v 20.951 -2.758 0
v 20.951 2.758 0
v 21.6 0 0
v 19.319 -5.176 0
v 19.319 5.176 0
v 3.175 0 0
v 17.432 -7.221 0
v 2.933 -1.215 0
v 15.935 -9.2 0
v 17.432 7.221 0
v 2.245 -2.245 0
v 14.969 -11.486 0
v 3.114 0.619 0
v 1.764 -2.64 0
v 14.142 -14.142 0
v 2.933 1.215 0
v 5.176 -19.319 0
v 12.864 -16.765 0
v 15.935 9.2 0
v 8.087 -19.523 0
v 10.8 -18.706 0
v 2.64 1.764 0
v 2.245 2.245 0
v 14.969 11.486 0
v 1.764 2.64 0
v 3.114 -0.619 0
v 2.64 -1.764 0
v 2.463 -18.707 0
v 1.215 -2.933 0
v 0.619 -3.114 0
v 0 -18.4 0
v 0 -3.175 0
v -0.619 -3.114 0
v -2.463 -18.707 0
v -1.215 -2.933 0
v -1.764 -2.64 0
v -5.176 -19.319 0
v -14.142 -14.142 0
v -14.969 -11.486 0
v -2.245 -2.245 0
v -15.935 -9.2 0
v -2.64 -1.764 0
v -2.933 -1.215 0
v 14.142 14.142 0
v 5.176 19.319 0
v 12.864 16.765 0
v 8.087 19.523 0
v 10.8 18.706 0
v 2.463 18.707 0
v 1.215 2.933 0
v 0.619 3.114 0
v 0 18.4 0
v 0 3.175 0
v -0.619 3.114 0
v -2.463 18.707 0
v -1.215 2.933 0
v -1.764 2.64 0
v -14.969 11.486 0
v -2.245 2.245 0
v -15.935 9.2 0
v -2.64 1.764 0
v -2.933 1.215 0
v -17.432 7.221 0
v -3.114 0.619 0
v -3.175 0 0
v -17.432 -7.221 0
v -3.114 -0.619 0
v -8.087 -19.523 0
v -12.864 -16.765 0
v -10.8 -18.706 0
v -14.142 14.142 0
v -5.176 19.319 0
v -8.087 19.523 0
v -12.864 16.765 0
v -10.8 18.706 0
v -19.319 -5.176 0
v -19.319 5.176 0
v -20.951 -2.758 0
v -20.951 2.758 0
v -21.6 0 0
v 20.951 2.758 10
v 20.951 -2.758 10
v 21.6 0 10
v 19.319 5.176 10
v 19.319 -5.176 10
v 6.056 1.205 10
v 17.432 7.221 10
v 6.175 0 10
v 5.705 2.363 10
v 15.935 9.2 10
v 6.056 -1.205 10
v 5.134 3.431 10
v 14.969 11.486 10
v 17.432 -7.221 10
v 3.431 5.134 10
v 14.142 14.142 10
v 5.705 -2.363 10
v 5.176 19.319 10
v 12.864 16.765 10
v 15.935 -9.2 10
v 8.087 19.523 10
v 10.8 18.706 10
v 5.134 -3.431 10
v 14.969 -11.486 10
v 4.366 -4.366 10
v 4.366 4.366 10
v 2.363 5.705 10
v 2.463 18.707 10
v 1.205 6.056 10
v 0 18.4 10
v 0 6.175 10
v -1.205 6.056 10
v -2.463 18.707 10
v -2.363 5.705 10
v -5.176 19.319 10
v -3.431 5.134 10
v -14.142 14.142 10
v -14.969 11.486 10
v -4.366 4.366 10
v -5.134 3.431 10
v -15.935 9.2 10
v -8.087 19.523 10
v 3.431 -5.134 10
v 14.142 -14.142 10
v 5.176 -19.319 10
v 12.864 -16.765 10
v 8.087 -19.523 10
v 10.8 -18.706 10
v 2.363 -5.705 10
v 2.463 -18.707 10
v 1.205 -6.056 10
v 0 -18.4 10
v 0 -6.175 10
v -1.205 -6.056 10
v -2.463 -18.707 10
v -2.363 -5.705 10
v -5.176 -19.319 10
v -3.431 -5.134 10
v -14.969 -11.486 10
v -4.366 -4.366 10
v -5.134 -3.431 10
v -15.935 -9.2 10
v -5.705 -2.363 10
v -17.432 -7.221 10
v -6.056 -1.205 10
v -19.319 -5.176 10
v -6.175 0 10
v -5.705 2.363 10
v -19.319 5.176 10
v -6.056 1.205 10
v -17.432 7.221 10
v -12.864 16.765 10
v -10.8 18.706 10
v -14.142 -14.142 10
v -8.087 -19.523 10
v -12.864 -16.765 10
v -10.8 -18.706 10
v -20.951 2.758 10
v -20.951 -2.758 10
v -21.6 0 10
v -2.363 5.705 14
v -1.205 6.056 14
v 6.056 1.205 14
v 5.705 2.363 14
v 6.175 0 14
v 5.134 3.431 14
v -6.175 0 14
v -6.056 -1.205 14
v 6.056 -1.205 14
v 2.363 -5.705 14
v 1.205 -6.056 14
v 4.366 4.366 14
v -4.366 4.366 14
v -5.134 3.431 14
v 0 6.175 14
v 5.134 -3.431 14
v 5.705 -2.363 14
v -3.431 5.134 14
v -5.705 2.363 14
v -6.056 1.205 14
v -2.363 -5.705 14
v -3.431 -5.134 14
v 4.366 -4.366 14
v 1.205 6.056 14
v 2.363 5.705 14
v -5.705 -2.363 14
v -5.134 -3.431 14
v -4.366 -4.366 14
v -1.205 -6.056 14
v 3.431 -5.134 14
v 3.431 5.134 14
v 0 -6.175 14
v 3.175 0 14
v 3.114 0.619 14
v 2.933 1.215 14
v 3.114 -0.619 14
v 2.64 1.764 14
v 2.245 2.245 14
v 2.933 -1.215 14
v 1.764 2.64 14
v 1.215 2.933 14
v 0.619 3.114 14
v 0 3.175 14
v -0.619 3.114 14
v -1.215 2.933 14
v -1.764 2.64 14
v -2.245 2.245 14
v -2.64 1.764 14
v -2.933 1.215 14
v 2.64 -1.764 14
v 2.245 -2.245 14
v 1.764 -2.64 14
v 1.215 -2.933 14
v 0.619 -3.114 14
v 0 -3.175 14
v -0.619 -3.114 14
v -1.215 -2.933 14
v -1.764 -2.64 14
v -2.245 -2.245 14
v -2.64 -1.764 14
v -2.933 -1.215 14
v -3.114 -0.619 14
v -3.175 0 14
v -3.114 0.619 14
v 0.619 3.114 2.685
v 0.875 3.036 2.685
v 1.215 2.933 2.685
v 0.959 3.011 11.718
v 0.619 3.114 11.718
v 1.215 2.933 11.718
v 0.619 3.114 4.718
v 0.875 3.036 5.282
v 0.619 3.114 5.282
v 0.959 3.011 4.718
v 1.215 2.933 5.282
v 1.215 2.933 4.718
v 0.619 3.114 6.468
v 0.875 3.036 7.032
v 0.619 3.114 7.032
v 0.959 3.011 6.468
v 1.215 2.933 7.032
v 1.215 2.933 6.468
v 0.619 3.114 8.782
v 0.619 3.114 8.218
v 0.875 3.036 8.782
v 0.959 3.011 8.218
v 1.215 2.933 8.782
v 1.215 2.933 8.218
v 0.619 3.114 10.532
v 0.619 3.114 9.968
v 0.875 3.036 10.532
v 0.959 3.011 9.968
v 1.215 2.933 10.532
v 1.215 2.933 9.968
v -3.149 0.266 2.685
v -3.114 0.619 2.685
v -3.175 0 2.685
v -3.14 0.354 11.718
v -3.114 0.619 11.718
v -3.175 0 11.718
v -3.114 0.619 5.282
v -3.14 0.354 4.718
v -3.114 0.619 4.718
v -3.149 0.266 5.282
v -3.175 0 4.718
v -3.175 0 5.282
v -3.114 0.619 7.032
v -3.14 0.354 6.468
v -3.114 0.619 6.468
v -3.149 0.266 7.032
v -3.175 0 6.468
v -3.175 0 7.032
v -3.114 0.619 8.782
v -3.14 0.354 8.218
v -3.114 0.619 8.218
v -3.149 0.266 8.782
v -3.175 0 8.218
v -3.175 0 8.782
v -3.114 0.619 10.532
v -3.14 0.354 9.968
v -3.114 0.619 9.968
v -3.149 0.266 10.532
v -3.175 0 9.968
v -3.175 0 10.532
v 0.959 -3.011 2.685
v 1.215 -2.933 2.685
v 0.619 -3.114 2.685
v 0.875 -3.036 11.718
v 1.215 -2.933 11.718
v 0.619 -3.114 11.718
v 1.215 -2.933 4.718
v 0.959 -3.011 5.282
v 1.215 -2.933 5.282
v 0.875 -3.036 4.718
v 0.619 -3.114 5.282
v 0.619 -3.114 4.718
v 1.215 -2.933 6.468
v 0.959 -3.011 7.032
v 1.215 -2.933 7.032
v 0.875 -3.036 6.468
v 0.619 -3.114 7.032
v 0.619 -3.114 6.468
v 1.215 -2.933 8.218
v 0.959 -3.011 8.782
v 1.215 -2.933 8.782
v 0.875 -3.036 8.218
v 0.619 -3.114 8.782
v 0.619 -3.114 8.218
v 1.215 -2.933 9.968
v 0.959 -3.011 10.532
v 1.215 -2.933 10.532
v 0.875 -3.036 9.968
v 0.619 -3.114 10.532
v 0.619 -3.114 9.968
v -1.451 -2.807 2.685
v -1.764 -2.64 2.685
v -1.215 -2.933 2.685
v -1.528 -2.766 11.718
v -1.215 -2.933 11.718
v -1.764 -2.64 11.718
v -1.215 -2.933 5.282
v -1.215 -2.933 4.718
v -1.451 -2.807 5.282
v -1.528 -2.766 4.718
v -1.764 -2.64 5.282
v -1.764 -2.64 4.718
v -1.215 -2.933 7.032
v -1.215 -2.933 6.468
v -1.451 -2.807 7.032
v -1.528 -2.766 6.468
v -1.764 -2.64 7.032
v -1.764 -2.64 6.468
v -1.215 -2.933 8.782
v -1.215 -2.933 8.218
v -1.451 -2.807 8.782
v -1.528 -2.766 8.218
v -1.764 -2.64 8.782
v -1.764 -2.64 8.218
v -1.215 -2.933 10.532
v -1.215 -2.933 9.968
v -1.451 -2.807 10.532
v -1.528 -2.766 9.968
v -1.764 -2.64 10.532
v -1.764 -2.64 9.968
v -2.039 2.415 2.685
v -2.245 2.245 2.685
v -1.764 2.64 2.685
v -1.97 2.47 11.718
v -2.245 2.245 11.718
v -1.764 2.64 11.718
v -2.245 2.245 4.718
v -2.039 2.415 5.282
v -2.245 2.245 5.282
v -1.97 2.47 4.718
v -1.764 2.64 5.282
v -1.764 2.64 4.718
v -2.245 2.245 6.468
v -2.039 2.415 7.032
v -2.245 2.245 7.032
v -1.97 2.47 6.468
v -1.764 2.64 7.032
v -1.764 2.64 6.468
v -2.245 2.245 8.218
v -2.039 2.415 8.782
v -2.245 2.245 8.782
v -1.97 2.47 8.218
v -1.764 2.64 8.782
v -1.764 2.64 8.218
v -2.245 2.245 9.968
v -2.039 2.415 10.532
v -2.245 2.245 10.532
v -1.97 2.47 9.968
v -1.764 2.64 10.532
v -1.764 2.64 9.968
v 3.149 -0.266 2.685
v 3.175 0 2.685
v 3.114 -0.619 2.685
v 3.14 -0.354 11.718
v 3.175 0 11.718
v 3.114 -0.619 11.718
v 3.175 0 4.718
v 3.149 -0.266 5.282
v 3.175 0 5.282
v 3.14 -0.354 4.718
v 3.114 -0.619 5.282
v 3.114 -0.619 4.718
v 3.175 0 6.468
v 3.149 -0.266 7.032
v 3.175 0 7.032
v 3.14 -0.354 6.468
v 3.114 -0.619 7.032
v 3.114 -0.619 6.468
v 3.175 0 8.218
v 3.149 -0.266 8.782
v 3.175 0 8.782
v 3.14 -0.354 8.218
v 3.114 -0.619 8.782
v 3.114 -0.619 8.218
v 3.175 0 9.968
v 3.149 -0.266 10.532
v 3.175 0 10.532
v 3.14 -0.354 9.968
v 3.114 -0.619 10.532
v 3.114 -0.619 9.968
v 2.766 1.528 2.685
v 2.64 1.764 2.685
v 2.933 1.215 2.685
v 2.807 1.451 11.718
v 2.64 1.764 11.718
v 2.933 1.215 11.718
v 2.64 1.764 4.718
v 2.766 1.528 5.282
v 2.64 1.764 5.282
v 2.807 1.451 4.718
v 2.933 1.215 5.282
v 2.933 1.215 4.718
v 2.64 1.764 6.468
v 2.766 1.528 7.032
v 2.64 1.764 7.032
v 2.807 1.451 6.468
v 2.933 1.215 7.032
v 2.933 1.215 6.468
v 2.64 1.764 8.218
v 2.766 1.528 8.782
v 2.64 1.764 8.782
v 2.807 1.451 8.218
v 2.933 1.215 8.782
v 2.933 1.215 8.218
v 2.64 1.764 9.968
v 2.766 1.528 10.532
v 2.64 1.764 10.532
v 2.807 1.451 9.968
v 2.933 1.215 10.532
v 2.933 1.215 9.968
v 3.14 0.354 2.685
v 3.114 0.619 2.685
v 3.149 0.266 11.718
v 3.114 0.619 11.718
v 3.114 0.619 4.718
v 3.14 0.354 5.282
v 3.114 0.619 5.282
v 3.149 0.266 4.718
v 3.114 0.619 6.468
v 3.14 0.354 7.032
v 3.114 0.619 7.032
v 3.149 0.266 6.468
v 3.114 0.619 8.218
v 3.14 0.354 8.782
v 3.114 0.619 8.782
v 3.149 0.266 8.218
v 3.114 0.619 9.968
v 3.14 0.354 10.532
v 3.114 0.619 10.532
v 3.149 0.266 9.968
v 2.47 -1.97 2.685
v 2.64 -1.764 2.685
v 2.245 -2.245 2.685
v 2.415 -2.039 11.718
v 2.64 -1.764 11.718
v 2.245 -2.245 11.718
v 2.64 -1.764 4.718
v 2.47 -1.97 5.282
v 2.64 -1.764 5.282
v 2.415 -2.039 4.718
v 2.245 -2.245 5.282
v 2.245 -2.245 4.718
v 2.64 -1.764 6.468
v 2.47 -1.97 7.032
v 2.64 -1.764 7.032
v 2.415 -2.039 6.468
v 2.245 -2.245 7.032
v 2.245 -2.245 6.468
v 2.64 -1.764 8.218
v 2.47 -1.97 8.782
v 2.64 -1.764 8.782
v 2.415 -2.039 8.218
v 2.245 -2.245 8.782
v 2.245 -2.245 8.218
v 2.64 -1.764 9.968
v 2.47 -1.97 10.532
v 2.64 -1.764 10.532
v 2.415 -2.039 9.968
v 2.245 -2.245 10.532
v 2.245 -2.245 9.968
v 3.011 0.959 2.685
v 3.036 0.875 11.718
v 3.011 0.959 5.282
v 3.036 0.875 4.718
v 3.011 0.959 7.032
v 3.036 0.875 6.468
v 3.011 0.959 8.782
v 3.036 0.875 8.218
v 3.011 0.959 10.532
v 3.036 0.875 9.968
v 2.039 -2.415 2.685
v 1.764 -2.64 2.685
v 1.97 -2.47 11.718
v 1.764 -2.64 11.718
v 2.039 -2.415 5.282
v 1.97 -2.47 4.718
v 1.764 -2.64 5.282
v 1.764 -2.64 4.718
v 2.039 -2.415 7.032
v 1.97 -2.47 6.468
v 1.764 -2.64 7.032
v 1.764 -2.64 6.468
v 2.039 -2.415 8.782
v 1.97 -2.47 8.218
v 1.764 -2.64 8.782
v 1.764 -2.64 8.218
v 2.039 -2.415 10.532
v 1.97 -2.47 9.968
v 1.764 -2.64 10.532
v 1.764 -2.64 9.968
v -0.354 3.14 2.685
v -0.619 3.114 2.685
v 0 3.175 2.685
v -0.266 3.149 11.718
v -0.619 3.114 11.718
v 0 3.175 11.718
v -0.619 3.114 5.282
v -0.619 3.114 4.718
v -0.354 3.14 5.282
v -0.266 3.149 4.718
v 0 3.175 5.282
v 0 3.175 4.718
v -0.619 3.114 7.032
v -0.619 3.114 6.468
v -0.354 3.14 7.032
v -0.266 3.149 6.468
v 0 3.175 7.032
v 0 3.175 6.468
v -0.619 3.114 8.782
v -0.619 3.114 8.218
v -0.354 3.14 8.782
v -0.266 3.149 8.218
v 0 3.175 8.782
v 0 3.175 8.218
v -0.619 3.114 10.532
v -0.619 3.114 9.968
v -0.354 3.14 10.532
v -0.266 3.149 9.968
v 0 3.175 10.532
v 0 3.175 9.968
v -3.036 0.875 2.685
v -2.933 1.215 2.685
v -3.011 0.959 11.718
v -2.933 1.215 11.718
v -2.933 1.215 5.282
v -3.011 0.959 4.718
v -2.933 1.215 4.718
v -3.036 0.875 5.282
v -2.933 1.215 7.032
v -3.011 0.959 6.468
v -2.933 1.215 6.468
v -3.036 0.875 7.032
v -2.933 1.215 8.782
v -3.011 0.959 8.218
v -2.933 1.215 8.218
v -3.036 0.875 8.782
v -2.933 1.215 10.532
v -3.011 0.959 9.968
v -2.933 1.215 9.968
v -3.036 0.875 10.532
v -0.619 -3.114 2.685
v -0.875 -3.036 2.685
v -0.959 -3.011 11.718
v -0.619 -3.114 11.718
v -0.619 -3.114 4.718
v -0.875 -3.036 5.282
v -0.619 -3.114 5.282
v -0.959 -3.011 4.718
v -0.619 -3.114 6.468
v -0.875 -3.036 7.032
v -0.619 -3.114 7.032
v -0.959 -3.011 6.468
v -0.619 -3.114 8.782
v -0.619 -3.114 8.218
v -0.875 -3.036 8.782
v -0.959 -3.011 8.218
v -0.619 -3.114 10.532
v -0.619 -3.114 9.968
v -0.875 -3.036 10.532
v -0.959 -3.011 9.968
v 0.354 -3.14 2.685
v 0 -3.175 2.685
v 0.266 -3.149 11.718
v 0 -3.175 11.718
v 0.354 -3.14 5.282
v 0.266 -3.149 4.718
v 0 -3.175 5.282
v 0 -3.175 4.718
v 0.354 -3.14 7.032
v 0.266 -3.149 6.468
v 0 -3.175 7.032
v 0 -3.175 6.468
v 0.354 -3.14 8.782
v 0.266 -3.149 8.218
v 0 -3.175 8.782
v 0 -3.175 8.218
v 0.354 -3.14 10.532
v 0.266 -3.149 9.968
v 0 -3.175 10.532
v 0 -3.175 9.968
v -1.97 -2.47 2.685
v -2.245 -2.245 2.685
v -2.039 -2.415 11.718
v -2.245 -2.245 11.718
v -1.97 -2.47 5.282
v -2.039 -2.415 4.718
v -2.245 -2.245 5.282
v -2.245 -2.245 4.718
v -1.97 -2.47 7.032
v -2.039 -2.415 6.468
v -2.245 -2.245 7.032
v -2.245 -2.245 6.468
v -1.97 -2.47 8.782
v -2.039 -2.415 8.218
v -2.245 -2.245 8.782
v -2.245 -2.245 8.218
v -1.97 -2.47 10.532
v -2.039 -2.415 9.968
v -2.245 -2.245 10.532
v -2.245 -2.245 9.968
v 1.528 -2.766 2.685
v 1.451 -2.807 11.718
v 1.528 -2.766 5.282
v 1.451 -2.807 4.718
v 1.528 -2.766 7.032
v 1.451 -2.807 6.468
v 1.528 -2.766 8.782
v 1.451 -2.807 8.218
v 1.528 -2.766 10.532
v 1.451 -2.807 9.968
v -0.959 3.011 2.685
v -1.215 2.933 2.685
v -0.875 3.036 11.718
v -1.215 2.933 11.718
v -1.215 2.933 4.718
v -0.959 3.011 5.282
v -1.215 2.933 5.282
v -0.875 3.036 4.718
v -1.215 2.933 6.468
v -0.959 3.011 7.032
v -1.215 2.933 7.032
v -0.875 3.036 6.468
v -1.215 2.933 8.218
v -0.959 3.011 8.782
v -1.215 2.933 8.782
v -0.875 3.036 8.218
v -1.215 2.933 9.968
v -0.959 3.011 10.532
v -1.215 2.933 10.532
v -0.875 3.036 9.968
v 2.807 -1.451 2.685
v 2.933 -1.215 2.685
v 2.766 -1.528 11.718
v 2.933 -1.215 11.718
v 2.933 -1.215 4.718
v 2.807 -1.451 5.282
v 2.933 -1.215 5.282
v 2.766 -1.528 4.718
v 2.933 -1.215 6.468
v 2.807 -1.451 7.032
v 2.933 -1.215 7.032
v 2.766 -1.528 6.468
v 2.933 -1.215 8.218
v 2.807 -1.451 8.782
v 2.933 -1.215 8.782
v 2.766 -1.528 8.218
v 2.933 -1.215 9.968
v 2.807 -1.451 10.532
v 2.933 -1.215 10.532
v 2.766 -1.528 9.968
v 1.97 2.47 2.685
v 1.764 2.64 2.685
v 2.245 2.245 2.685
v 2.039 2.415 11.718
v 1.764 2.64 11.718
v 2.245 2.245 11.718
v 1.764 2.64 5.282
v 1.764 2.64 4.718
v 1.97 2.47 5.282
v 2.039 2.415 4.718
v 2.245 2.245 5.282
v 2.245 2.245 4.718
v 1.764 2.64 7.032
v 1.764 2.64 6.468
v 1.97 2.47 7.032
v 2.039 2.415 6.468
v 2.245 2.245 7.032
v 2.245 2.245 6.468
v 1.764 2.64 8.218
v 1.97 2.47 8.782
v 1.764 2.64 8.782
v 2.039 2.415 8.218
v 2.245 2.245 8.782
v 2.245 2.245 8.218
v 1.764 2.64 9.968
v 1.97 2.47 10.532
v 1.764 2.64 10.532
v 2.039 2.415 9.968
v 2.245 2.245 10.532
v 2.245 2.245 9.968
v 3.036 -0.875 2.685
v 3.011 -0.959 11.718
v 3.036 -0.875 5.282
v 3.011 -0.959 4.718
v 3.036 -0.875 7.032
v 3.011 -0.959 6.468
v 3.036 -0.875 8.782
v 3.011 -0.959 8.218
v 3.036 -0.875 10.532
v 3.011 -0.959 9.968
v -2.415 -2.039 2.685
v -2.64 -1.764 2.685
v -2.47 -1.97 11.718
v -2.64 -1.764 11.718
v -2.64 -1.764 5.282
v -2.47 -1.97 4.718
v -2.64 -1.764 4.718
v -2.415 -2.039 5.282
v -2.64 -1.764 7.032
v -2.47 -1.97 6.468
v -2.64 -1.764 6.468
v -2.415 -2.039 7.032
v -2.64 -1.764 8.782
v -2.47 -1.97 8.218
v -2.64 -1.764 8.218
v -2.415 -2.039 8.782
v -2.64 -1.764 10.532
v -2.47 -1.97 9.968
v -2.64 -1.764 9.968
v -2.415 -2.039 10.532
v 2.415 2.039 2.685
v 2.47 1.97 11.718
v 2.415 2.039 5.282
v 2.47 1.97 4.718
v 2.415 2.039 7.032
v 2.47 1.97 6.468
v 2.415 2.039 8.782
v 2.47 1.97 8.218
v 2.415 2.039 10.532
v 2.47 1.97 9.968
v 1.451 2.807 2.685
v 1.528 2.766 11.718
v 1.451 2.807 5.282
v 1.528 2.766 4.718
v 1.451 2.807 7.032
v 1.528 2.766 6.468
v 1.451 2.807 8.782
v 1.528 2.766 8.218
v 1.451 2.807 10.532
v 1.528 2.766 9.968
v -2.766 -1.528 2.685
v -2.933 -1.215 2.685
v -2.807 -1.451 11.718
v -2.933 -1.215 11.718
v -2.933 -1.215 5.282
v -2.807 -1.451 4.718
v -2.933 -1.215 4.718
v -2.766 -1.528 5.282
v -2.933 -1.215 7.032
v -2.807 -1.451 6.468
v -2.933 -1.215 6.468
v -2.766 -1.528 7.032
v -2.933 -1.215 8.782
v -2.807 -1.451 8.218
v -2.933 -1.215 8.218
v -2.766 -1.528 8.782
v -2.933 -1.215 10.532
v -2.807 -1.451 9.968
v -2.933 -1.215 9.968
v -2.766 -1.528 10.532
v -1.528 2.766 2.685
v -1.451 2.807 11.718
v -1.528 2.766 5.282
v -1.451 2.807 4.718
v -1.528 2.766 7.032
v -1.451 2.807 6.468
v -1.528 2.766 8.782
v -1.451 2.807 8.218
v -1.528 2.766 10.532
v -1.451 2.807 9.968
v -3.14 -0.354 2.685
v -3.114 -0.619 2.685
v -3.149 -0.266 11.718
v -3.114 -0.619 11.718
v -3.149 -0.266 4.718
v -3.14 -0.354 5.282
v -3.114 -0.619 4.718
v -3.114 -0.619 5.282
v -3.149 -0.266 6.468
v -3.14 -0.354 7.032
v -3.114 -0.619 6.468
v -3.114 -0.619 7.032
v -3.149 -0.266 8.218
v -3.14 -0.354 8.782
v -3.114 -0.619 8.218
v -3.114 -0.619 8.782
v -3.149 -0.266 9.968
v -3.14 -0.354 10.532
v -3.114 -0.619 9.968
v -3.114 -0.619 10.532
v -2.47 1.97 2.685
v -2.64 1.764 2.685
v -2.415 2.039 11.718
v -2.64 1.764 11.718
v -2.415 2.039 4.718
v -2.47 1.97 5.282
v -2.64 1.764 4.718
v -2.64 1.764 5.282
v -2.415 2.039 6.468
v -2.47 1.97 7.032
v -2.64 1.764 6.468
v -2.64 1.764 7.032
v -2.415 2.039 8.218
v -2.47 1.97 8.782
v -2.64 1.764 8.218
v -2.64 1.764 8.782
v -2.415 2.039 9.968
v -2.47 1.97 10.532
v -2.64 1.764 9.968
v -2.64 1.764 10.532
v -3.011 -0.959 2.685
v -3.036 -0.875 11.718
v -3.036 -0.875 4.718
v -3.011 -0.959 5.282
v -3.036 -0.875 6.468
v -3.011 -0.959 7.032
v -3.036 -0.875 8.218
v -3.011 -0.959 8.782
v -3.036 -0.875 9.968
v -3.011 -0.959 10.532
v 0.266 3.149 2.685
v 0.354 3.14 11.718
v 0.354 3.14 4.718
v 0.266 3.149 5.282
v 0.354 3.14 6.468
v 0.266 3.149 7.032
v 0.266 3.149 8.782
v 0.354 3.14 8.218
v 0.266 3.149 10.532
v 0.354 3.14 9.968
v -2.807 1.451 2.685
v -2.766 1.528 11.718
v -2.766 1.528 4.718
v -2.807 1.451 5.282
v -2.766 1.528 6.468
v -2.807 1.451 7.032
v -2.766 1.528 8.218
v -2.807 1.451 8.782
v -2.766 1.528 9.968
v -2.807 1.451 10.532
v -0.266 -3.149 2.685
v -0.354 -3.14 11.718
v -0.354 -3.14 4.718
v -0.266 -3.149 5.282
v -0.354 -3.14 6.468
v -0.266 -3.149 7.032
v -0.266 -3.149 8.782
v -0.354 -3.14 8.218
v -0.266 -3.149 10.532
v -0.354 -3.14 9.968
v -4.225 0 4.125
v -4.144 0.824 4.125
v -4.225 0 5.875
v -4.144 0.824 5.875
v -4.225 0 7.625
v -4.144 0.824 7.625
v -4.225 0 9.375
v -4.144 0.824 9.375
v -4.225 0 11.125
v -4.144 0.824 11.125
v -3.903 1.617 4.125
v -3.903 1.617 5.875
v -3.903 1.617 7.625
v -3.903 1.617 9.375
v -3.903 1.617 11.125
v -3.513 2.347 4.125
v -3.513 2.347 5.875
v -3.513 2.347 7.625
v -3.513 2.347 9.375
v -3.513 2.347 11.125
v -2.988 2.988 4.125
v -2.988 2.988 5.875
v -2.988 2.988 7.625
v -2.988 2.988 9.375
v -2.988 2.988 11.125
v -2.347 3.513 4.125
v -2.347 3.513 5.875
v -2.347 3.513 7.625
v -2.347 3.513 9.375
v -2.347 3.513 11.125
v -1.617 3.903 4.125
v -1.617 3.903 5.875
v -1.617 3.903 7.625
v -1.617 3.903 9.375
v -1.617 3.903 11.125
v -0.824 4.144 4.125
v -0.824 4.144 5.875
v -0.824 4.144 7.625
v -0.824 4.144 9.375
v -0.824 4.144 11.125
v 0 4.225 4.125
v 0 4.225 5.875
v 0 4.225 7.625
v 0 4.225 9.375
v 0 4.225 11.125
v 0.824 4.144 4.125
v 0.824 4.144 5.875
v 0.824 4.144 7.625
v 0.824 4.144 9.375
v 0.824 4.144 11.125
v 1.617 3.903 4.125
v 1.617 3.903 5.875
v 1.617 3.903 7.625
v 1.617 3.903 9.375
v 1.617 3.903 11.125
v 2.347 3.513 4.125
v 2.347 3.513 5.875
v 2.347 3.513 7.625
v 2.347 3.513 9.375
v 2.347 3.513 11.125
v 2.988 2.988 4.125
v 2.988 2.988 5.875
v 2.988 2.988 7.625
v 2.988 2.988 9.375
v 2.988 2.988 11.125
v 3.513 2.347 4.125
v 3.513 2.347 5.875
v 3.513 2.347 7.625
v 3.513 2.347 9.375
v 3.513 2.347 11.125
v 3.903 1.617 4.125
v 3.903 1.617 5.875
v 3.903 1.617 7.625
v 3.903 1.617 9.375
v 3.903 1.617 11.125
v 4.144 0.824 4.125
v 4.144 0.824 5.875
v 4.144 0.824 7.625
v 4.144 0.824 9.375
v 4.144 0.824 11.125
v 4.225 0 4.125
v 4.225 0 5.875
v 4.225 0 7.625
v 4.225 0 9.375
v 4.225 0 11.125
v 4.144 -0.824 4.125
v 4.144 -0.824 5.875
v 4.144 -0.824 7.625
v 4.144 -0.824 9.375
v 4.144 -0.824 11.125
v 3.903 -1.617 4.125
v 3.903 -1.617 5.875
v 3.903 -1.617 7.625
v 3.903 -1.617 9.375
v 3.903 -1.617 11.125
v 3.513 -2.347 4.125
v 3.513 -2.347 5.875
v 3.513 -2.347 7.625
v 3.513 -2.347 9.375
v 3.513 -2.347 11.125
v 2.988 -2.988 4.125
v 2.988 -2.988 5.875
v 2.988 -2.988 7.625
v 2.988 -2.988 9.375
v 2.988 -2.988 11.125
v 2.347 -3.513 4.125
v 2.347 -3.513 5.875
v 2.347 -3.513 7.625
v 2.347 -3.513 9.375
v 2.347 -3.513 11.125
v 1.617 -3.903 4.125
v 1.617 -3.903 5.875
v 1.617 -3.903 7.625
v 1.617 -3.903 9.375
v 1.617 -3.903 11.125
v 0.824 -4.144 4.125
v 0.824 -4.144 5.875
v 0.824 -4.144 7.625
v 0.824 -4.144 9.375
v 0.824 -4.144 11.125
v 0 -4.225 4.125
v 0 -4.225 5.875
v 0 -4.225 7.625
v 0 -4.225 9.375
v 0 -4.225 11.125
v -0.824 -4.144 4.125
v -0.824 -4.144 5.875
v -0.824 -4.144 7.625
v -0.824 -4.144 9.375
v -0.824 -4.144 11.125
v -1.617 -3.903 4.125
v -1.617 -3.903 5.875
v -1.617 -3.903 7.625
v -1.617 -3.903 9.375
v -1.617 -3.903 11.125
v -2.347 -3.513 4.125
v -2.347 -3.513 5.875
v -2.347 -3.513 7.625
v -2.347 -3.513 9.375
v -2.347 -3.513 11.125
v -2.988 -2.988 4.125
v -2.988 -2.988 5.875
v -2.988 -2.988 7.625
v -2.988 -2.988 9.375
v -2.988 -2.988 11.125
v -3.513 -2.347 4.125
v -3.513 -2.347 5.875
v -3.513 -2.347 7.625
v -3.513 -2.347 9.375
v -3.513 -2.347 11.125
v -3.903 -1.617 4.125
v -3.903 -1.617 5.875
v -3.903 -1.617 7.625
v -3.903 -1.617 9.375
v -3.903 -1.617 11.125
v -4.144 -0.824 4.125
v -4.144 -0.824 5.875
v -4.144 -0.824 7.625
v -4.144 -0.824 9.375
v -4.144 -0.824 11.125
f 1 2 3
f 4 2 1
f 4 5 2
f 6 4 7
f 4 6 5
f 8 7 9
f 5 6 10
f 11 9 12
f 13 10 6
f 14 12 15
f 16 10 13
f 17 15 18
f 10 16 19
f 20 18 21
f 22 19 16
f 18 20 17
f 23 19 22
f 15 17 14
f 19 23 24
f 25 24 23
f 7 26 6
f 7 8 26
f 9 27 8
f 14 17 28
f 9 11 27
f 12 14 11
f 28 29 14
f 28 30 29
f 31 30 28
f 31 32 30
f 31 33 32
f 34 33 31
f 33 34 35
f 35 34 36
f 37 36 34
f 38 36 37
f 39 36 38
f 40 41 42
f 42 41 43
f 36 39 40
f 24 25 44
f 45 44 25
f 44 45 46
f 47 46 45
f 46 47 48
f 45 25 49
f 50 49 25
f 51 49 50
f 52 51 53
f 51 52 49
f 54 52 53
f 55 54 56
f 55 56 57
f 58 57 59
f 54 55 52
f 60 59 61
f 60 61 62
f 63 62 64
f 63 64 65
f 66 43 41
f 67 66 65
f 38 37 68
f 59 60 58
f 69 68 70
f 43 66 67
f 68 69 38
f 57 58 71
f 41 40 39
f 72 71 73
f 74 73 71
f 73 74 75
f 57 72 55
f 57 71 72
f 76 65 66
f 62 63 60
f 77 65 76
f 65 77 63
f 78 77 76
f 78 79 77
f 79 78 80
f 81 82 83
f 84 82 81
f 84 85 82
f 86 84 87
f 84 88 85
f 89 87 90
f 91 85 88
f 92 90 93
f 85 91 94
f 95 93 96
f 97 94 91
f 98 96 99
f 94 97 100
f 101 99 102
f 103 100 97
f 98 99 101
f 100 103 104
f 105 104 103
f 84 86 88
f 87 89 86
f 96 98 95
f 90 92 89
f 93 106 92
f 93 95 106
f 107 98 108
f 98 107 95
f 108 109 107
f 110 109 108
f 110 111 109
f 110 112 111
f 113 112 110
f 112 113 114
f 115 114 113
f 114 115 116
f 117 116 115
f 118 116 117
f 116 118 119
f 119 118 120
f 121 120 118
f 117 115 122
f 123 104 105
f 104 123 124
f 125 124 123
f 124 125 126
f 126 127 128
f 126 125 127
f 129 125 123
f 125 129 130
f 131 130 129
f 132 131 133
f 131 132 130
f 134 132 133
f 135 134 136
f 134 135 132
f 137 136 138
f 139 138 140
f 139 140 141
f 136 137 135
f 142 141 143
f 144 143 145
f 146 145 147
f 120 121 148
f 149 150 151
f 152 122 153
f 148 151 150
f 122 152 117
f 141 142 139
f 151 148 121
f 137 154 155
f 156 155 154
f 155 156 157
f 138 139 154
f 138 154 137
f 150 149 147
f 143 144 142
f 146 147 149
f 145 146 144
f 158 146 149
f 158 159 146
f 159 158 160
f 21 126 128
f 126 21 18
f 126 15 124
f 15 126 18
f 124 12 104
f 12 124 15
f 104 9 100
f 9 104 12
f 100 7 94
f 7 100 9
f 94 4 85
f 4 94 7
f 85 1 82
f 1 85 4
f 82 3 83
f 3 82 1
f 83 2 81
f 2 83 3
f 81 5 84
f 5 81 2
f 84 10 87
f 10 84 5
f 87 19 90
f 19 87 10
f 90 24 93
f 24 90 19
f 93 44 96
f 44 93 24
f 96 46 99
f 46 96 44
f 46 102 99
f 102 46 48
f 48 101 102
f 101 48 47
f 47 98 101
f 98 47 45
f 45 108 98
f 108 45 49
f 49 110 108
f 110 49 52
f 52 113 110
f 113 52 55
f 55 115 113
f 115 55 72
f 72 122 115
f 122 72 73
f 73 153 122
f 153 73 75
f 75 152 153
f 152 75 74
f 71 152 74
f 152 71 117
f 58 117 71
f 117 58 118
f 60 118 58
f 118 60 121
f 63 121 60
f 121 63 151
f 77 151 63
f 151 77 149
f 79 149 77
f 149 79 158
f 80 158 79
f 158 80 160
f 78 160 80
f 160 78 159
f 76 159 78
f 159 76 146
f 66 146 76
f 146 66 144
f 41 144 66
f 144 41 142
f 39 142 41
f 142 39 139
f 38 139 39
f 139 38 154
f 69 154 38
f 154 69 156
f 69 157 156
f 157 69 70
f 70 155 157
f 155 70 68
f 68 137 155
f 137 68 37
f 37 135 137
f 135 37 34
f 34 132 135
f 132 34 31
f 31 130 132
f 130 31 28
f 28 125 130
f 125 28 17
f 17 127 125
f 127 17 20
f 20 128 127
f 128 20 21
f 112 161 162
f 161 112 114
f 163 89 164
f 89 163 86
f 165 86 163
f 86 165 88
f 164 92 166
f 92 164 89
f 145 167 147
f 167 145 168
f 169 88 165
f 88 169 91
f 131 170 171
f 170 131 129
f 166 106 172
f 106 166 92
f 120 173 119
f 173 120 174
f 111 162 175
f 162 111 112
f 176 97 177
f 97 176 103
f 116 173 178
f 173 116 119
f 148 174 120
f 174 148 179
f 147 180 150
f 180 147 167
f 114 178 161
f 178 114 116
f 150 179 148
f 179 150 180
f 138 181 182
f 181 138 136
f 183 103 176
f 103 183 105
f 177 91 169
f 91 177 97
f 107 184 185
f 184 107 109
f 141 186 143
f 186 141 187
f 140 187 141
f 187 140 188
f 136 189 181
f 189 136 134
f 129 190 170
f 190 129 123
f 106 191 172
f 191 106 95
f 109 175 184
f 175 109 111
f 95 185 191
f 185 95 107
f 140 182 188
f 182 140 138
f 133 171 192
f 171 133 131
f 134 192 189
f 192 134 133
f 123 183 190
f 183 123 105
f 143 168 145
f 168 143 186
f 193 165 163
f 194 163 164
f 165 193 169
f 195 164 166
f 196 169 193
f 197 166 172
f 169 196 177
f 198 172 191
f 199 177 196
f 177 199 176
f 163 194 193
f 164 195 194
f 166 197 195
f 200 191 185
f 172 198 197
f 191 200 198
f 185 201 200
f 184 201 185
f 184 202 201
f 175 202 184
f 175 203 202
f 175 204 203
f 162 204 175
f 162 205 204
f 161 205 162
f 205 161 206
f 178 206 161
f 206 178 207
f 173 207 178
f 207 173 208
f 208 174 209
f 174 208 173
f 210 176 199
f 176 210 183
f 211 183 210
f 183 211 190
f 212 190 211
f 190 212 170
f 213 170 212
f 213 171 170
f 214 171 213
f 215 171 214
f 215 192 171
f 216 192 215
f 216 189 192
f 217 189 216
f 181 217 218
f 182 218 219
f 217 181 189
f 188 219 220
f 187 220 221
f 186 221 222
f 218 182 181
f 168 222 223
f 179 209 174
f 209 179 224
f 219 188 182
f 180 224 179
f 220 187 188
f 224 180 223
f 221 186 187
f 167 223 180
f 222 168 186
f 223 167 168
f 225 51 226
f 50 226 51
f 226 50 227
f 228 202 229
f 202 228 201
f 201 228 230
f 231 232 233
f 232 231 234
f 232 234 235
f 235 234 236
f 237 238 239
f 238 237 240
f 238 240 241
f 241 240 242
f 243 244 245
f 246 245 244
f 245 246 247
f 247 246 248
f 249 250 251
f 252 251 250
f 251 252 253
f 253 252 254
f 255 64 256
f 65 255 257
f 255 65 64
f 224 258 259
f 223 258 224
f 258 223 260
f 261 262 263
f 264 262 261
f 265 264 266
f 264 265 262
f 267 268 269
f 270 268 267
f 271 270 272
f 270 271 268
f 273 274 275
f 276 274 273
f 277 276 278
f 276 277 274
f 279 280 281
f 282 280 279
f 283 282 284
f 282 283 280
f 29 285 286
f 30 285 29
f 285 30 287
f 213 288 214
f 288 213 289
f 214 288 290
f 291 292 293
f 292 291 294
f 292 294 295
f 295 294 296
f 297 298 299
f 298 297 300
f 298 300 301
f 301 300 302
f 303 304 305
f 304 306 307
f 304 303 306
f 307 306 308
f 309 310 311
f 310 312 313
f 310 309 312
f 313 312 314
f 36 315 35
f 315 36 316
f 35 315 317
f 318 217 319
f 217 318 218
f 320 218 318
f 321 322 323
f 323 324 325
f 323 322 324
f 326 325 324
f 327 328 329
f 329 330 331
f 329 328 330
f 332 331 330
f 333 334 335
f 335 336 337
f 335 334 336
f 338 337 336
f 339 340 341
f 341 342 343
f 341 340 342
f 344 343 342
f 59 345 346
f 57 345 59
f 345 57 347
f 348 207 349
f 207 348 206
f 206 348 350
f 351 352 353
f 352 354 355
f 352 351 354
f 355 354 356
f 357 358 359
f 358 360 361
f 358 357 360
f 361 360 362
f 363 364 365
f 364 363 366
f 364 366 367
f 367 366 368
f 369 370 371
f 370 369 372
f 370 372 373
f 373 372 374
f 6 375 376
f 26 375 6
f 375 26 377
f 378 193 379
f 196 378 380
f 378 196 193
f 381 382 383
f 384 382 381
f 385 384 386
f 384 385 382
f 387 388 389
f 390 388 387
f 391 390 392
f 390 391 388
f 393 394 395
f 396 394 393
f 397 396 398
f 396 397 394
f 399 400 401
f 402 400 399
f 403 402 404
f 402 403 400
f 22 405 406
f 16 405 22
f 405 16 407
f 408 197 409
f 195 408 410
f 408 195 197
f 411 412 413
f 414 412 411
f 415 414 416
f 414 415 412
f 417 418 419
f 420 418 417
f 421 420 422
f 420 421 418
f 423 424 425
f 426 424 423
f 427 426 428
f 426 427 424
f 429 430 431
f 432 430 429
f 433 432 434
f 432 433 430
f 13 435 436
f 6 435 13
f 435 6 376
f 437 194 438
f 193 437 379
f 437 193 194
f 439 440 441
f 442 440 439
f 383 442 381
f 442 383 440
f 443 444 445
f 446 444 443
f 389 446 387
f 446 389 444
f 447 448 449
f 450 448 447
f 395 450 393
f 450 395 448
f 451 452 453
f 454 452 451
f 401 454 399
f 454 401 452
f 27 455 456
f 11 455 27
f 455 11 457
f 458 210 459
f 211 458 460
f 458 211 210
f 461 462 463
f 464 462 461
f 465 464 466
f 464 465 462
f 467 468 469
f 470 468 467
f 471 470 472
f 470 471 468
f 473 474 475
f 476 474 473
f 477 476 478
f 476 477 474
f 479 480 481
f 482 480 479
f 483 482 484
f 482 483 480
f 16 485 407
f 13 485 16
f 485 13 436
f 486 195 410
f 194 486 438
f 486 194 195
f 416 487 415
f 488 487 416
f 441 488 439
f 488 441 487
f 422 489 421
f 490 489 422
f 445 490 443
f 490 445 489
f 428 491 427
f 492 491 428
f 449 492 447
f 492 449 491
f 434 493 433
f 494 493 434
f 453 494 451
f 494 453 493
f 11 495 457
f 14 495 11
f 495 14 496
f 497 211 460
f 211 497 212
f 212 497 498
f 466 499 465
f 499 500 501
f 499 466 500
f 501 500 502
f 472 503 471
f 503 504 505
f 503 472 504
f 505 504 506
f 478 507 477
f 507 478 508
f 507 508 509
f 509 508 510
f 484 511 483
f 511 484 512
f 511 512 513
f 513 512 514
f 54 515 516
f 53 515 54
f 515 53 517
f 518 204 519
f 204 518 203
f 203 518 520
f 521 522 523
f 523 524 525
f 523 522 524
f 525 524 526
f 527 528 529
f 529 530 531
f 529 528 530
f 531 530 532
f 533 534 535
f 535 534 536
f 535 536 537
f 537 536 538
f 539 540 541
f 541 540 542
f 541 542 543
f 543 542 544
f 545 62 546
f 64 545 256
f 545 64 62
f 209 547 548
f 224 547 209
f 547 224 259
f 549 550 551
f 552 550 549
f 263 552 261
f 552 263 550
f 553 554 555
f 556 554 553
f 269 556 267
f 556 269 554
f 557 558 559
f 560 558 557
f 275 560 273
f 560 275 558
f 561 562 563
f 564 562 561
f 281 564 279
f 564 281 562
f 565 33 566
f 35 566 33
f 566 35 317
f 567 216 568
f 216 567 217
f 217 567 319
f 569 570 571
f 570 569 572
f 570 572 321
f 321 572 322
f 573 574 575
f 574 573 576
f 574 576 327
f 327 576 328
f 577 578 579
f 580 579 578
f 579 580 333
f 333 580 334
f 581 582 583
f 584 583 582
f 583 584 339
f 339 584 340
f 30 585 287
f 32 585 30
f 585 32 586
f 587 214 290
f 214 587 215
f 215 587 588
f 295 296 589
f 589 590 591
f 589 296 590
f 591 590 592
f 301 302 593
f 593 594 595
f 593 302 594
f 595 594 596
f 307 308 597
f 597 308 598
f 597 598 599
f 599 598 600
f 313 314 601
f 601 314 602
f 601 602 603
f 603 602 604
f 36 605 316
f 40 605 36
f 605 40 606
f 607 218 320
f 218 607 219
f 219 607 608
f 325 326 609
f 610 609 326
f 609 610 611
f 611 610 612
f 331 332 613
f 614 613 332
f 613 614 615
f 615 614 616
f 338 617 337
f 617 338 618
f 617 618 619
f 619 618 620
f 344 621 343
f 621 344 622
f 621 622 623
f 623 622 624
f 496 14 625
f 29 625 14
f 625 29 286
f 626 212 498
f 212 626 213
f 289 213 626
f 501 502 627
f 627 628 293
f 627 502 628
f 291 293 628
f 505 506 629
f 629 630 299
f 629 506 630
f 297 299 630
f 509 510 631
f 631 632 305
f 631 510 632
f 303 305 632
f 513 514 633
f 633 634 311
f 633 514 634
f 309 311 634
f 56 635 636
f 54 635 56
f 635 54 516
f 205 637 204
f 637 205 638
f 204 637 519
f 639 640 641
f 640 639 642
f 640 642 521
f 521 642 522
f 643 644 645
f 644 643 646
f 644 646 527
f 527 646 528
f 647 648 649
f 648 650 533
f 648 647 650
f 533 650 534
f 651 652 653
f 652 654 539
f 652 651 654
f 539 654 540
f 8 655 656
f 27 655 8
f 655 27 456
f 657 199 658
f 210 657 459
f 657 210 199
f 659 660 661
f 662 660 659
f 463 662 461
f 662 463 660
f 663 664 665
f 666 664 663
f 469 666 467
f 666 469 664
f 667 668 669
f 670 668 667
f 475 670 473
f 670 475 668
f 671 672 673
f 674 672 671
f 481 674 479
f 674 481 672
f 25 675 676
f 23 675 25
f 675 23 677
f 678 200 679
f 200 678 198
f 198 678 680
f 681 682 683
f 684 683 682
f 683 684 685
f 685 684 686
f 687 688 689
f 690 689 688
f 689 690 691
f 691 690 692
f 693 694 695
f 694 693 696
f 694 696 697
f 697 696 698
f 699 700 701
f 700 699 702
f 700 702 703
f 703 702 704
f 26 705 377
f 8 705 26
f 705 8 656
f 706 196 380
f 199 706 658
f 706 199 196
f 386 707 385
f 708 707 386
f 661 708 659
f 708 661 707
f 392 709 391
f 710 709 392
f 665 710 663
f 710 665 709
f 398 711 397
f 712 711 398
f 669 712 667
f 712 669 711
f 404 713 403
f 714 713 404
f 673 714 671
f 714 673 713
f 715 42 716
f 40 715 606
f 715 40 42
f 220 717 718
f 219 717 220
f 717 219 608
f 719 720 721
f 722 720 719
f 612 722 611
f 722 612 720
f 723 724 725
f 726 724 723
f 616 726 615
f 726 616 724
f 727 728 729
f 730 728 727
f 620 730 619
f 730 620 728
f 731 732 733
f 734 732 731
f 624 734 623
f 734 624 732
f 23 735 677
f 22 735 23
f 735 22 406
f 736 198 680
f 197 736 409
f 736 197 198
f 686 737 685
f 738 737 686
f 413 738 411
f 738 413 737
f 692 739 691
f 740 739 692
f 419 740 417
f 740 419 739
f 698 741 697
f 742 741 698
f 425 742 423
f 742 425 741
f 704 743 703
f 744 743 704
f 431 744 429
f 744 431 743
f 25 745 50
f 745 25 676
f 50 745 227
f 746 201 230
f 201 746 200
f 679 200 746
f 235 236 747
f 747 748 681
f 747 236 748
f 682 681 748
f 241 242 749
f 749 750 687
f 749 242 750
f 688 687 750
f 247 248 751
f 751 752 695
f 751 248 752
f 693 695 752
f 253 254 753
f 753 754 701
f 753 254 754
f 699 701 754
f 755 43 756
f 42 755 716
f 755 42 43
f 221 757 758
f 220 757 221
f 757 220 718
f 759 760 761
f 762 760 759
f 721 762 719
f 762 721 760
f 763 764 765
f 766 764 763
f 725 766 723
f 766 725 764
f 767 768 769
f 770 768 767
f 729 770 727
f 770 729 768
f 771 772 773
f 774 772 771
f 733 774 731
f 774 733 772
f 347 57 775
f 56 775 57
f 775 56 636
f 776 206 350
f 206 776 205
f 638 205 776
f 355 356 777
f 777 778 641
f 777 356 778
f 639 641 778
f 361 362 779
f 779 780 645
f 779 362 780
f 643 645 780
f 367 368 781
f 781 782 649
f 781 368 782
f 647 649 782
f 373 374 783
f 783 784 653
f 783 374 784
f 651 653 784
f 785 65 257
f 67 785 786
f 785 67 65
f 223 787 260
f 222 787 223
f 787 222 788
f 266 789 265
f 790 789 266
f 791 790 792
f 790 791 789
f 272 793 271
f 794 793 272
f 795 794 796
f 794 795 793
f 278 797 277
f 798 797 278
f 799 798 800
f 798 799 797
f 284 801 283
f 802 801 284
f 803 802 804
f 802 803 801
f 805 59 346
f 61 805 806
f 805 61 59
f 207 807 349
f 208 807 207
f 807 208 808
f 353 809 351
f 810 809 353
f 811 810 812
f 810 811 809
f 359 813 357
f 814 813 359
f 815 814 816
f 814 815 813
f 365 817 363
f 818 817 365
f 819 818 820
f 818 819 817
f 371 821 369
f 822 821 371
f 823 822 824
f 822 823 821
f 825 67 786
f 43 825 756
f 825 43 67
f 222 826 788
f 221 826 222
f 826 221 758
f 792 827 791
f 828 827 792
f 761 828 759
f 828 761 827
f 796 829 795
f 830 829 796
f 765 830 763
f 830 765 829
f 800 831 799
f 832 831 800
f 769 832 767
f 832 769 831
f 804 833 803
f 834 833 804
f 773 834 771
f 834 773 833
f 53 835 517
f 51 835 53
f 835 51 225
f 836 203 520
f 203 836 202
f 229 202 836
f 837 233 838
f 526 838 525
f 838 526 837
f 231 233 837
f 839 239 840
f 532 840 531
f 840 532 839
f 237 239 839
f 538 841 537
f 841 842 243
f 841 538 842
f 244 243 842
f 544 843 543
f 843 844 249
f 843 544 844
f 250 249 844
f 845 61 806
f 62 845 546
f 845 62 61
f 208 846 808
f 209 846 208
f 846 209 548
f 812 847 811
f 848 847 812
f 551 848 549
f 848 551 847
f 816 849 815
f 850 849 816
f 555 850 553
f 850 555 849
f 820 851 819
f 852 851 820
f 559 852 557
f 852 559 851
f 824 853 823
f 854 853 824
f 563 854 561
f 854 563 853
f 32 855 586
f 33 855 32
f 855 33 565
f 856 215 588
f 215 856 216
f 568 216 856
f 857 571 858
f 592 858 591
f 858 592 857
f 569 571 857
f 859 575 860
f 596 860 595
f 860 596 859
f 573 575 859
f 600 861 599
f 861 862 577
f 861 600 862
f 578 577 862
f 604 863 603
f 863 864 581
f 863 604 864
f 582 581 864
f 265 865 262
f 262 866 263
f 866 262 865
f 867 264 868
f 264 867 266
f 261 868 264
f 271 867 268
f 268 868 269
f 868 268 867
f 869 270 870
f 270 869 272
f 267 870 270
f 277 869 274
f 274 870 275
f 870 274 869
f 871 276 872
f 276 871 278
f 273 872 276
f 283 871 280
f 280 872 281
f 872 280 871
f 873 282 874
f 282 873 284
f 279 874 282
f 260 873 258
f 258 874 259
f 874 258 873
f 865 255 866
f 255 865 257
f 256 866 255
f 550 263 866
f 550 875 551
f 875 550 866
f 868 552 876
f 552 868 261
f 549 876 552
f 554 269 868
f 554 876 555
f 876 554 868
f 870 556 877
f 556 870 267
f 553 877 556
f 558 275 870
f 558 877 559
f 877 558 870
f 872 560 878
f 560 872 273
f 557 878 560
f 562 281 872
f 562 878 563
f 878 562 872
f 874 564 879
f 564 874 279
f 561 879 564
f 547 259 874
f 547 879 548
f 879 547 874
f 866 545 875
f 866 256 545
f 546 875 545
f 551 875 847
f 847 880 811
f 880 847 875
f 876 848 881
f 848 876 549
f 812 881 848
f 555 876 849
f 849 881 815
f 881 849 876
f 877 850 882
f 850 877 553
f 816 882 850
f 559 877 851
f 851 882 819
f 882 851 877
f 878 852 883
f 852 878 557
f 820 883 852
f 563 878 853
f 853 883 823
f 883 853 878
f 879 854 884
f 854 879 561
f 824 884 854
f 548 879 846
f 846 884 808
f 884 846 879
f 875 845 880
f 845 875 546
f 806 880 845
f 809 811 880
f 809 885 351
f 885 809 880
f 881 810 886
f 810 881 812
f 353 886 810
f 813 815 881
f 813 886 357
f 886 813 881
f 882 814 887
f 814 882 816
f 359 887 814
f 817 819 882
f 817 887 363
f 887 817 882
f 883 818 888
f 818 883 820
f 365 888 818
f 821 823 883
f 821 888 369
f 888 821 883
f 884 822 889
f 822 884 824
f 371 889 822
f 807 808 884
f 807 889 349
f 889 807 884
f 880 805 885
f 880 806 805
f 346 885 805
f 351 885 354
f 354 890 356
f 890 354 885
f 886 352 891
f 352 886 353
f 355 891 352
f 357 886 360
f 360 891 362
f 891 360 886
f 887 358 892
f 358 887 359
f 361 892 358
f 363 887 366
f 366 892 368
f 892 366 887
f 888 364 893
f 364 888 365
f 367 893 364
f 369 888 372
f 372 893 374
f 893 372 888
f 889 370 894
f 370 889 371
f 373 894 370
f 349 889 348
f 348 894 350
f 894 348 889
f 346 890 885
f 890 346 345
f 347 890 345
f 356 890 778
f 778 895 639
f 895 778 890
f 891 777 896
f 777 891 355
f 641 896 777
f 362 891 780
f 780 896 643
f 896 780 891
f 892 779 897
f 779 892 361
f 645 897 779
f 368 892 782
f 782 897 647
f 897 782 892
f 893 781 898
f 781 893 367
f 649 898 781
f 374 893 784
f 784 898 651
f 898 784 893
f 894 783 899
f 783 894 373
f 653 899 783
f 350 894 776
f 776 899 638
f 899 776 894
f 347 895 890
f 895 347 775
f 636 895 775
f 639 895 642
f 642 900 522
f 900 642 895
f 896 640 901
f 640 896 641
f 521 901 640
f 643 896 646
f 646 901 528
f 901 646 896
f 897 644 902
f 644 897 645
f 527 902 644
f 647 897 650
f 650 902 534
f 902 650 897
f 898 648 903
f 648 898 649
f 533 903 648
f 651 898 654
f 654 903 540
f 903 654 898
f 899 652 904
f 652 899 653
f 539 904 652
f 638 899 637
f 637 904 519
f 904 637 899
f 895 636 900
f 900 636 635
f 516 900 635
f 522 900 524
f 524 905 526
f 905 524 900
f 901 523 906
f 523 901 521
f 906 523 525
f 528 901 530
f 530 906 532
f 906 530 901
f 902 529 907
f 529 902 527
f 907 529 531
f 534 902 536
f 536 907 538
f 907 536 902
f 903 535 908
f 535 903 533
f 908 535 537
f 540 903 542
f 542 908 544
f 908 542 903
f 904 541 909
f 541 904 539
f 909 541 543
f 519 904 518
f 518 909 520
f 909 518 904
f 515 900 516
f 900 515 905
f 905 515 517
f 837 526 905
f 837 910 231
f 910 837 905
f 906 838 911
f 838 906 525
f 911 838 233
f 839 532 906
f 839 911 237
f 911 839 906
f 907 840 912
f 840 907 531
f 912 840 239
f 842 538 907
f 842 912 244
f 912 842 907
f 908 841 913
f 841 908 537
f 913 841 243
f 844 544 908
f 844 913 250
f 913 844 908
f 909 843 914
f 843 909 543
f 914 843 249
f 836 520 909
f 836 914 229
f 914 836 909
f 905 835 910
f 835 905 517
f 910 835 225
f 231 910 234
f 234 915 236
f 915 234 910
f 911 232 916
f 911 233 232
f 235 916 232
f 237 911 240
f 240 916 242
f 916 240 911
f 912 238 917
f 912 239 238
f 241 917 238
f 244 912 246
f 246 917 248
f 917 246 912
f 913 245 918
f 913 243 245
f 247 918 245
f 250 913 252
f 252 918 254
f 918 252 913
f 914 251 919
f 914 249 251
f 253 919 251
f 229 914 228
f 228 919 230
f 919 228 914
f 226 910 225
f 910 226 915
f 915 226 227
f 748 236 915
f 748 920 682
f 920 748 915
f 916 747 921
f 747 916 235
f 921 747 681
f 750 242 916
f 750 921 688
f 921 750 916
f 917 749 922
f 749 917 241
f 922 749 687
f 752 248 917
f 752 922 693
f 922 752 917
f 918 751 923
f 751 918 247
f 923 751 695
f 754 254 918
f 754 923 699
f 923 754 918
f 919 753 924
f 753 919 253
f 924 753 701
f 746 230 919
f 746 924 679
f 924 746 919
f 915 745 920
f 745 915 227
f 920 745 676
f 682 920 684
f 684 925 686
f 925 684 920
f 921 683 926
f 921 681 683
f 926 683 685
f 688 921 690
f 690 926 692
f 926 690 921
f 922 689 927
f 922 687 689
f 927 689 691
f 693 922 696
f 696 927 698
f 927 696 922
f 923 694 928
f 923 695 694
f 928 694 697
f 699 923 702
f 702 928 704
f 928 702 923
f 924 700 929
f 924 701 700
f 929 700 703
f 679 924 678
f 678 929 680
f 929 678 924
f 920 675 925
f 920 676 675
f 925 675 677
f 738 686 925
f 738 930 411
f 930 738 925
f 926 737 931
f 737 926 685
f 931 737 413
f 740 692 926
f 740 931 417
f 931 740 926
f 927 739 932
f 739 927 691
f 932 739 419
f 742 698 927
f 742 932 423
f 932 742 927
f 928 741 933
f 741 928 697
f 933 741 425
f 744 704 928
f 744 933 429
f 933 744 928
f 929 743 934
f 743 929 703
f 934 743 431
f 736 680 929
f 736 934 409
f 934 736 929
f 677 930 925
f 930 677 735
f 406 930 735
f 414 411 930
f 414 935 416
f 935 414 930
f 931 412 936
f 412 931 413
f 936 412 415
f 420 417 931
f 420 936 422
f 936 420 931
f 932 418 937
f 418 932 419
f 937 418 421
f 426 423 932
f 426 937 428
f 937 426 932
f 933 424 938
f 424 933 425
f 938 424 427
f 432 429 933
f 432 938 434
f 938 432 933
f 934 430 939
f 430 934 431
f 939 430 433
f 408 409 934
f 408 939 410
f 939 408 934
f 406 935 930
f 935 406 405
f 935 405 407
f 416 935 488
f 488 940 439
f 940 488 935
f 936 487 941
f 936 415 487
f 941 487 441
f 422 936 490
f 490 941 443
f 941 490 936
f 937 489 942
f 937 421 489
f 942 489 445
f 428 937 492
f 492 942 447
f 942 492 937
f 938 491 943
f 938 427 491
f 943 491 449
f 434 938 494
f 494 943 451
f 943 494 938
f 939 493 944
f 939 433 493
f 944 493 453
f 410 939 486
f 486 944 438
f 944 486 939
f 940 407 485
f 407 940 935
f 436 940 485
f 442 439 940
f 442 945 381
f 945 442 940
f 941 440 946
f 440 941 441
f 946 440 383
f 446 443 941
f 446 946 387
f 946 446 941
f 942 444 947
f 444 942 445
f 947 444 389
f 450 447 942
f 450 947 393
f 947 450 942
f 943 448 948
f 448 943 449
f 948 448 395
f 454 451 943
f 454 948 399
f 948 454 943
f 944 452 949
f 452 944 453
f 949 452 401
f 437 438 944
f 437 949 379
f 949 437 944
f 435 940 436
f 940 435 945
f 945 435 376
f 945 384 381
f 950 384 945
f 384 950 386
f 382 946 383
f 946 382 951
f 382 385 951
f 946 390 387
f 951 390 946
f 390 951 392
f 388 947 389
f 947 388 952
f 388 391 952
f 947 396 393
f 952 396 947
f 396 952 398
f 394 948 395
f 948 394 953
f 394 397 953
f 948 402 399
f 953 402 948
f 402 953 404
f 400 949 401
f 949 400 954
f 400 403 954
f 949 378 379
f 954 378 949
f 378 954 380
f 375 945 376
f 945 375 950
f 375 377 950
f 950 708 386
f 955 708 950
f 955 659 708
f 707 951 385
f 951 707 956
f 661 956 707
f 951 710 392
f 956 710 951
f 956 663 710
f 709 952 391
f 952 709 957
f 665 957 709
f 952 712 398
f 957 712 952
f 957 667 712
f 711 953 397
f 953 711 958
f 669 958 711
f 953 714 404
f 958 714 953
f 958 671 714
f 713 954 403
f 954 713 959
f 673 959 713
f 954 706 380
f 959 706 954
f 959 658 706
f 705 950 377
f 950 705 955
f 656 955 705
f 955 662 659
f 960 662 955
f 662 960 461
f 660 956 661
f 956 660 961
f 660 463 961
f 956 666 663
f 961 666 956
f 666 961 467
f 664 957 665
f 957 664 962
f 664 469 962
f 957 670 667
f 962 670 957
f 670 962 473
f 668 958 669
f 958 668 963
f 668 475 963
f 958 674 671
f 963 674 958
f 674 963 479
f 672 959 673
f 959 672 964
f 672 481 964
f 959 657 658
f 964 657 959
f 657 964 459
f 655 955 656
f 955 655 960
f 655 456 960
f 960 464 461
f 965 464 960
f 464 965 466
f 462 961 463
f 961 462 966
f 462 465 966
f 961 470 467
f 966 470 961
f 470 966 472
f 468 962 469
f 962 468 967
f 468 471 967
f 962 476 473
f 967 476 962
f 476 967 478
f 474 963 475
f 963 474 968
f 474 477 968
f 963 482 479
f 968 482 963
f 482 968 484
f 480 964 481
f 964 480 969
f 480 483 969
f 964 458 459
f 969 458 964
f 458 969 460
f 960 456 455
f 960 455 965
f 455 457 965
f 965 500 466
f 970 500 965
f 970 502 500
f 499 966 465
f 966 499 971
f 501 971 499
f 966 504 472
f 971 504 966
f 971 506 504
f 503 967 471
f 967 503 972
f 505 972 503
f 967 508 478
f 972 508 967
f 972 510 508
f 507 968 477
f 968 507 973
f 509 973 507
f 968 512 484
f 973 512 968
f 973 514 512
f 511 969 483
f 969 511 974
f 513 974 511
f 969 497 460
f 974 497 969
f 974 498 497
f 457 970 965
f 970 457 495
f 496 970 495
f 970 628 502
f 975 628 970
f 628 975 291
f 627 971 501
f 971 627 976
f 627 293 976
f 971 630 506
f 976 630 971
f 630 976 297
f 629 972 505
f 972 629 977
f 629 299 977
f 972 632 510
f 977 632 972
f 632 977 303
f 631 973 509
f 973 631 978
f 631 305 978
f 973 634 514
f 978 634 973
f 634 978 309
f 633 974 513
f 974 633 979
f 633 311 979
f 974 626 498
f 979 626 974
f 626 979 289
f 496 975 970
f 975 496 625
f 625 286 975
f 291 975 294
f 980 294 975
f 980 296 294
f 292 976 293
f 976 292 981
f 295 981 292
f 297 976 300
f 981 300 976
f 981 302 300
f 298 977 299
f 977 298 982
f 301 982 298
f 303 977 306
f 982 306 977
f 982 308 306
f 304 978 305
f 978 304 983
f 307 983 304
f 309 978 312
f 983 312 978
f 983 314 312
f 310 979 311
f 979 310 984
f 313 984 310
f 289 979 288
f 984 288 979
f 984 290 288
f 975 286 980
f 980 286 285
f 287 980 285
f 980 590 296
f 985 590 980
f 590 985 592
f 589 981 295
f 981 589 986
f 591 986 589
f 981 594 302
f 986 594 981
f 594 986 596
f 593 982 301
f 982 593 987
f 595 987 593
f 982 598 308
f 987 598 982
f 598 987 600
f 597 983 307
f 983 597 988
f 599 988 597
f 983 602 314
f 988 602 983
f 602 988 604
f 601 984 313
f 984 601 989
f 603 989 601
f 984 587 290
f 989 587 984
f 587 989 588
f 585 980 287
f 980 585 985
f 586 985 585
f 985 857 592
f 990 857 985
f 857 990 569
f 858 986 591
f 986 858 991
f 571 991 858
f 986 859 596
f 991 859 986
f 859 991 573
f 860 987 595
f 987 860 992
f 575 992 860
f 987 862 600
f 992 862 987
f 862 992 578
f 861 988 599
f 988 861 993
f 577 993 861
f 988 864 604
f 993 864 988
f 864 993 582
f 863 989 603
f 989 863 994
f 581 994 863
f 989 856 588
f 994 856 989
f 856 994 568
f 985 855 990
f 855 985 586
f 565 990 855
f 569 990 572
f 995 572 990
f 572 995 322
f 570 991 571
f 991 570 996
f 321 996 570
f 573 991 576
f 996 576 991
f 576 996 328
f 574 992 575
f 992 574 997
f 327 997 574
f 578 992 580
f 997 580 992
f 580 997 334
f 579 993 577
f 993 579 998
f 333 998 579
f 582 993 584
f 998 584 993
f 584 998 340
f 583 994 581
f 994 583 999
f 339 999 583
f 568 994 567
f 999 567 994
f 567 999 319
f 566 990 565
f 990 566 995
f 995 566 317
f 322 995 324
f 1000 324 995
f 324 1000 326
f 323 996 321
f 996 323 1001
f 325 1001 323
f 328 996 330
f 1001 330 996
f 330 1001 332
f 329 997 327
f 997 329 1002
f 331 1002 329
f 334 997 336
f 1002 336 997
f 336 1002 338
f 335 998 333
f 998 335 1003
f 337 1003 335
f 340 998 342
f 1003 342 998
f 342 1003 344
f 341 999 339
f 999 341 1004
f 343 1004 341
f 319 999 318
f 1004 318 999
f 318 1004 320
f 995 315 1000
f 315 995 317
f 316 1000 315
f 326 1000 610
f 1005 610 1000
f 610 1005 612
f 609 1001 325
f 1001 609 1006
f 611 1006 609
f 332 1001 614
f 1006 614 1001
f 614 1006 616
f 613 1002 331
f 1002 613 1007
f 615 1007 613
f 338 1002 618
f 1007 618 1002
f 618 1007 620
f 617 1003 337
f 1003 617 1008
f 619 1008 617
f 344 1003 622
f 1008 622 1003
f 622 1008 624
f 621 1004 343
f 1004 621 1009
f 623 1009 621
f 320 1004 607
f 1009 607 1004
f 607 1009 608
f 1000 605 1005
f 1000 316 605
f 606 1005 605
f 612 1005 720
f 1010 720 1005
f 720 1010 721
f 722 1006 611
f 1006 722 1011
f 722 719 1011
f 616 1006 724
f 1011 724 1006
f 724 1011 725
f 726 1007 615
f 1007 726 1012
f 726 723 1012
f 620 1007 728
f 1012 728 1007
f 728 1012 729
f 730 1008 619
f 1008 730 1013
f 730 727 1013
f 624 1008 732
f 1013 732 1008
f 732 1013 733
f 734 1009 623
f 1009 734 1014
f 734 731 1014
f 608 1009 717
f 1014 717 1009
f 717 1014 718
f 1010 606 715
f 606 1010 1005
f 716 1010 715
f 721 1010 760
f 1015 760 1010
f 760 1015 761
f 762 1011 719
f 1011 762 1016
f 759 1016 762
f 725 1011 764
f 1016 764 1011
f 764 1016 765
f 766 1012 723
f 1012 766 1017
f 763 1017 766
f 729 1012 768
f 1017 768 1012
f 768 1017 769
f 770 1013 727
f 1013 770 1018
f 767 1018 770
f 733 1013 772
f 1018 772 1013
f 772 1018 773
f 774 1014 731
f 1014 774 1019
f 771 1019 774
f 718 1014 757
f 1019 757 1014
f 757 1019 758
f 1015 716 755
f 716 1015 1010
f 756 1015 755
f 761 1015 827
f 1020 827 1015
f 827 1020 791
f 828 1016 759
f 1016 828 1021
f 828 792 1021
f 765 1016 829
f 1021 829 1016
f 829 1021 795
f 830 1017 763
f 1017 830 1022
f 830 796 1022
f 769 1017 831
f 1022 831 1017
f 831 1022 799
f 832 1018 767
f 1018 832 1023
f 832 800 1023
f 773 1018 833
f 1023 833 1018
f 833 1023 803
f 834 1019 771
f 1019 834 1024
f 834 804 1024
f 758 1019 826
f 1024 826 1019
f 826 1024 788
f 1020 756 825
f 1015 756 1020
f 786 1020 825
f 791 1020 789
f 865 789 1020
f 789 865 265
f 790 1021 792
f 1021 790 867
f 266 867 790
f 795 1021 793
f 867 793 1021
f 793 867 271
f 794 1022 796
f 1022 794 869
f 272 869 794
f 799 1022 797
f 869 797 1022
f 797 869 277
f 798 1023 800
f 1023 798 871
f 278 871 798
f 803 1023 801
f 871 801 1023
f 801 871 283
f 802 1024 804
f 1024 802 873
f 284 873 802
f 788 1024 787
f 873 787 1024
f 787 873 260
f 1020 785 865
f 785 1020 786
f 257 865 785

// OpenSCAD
$fn = 32;

// ----------------------------------------------------------------------
// Thumb nut: 6 lobe grip, 14 mm tall, M6.35 thread
// ----------------------------------------------------------------------

// --- parameters (mm) ---
base_r = 20;              // grip base radius
lobe_amp = 1.6;           // lobe height above the base radius
lobes = 6;                // number of grip lobes
grip_h = 10;              // grip height
boss_d = 12.35;           // threaded boss diameter
boss_h = 4;               // boss height
bore_d = 6.35;            // thread core diameter
pitch = 1.75;             // thread pitch
thread_d = 1.05;          // thread depth

grip = [[21.6, 0], [20.951, 2.758], [19.319, 5.176], [17.432, 7.221], [15.935, 9.2], [14.969, 11.486], [14.142, 14.142], [12.864, 16.765], [10.8, 18.706], [8.087, 19.523], [5.176, 19.319], [2.463, 18.707], [0, 18.4], [-2.463, 18.707], [-5.176, 19.319], [-8.087, 19.523], [-10.8, 18.706], [-12.864, 16.765], [-14.142, 14.142], [-14.969, 11.486], [-15.935, 9.2], [-17.432, 7.221], [-19.319, 5.176], [-20.951, 2.758], [-21.6, 0], [-20.951, -2.758], [-19.319, -5.176], [-17.432, -7.221], [-15.935, -9.2], [-14.969, -11.486], [-14.142, -14.142], [-12.864, -16.765], [-10.8, -18.706], [-8.087, -19.523], [-5.176, -19.319], [-2.463, -18.707], [0, -18.4], [2.463, -18.707], [5.176, -19.319], [8.087, -19.523], [10.8, -18.706], [12.864, -16.765], [14.142, -14.142], [14.969, -11.486], [15.935, -9.2], [17.432, -7.221], [19.319, -5.176], [20.951, -2.758]];

difference() {
  union() {
    /* grip outline extruded straight up */
    linear_extrude(height = grip_h) polygon(grip);
    /* boss sunk half a millimetre into the grip */
    translate([0, 0, grip_h - 0.5]) cylinder(h = boss_h + 0.5, d = boss_d);
  }
  /* threaded bore through grip and boss */
  translate([0, 0, -2.5]) cylinder(h = grip_h + boss_h + 5, d = bore_d);
  translate([0, 0, 2.0]) rotate_extrude() polygon([[2.175, 0], [2.175, 10], [2.675, 10], [4.225, 9.125], [2.675, 8.25], [4.225, 7.375], [2.675, 6.5], [4.225, 5.625], [2.675, 4.75], [4.225, 3.875], [2.675, 3], [4.225, 2.125], [2.675, 0], [2.175, 0]]);
}
